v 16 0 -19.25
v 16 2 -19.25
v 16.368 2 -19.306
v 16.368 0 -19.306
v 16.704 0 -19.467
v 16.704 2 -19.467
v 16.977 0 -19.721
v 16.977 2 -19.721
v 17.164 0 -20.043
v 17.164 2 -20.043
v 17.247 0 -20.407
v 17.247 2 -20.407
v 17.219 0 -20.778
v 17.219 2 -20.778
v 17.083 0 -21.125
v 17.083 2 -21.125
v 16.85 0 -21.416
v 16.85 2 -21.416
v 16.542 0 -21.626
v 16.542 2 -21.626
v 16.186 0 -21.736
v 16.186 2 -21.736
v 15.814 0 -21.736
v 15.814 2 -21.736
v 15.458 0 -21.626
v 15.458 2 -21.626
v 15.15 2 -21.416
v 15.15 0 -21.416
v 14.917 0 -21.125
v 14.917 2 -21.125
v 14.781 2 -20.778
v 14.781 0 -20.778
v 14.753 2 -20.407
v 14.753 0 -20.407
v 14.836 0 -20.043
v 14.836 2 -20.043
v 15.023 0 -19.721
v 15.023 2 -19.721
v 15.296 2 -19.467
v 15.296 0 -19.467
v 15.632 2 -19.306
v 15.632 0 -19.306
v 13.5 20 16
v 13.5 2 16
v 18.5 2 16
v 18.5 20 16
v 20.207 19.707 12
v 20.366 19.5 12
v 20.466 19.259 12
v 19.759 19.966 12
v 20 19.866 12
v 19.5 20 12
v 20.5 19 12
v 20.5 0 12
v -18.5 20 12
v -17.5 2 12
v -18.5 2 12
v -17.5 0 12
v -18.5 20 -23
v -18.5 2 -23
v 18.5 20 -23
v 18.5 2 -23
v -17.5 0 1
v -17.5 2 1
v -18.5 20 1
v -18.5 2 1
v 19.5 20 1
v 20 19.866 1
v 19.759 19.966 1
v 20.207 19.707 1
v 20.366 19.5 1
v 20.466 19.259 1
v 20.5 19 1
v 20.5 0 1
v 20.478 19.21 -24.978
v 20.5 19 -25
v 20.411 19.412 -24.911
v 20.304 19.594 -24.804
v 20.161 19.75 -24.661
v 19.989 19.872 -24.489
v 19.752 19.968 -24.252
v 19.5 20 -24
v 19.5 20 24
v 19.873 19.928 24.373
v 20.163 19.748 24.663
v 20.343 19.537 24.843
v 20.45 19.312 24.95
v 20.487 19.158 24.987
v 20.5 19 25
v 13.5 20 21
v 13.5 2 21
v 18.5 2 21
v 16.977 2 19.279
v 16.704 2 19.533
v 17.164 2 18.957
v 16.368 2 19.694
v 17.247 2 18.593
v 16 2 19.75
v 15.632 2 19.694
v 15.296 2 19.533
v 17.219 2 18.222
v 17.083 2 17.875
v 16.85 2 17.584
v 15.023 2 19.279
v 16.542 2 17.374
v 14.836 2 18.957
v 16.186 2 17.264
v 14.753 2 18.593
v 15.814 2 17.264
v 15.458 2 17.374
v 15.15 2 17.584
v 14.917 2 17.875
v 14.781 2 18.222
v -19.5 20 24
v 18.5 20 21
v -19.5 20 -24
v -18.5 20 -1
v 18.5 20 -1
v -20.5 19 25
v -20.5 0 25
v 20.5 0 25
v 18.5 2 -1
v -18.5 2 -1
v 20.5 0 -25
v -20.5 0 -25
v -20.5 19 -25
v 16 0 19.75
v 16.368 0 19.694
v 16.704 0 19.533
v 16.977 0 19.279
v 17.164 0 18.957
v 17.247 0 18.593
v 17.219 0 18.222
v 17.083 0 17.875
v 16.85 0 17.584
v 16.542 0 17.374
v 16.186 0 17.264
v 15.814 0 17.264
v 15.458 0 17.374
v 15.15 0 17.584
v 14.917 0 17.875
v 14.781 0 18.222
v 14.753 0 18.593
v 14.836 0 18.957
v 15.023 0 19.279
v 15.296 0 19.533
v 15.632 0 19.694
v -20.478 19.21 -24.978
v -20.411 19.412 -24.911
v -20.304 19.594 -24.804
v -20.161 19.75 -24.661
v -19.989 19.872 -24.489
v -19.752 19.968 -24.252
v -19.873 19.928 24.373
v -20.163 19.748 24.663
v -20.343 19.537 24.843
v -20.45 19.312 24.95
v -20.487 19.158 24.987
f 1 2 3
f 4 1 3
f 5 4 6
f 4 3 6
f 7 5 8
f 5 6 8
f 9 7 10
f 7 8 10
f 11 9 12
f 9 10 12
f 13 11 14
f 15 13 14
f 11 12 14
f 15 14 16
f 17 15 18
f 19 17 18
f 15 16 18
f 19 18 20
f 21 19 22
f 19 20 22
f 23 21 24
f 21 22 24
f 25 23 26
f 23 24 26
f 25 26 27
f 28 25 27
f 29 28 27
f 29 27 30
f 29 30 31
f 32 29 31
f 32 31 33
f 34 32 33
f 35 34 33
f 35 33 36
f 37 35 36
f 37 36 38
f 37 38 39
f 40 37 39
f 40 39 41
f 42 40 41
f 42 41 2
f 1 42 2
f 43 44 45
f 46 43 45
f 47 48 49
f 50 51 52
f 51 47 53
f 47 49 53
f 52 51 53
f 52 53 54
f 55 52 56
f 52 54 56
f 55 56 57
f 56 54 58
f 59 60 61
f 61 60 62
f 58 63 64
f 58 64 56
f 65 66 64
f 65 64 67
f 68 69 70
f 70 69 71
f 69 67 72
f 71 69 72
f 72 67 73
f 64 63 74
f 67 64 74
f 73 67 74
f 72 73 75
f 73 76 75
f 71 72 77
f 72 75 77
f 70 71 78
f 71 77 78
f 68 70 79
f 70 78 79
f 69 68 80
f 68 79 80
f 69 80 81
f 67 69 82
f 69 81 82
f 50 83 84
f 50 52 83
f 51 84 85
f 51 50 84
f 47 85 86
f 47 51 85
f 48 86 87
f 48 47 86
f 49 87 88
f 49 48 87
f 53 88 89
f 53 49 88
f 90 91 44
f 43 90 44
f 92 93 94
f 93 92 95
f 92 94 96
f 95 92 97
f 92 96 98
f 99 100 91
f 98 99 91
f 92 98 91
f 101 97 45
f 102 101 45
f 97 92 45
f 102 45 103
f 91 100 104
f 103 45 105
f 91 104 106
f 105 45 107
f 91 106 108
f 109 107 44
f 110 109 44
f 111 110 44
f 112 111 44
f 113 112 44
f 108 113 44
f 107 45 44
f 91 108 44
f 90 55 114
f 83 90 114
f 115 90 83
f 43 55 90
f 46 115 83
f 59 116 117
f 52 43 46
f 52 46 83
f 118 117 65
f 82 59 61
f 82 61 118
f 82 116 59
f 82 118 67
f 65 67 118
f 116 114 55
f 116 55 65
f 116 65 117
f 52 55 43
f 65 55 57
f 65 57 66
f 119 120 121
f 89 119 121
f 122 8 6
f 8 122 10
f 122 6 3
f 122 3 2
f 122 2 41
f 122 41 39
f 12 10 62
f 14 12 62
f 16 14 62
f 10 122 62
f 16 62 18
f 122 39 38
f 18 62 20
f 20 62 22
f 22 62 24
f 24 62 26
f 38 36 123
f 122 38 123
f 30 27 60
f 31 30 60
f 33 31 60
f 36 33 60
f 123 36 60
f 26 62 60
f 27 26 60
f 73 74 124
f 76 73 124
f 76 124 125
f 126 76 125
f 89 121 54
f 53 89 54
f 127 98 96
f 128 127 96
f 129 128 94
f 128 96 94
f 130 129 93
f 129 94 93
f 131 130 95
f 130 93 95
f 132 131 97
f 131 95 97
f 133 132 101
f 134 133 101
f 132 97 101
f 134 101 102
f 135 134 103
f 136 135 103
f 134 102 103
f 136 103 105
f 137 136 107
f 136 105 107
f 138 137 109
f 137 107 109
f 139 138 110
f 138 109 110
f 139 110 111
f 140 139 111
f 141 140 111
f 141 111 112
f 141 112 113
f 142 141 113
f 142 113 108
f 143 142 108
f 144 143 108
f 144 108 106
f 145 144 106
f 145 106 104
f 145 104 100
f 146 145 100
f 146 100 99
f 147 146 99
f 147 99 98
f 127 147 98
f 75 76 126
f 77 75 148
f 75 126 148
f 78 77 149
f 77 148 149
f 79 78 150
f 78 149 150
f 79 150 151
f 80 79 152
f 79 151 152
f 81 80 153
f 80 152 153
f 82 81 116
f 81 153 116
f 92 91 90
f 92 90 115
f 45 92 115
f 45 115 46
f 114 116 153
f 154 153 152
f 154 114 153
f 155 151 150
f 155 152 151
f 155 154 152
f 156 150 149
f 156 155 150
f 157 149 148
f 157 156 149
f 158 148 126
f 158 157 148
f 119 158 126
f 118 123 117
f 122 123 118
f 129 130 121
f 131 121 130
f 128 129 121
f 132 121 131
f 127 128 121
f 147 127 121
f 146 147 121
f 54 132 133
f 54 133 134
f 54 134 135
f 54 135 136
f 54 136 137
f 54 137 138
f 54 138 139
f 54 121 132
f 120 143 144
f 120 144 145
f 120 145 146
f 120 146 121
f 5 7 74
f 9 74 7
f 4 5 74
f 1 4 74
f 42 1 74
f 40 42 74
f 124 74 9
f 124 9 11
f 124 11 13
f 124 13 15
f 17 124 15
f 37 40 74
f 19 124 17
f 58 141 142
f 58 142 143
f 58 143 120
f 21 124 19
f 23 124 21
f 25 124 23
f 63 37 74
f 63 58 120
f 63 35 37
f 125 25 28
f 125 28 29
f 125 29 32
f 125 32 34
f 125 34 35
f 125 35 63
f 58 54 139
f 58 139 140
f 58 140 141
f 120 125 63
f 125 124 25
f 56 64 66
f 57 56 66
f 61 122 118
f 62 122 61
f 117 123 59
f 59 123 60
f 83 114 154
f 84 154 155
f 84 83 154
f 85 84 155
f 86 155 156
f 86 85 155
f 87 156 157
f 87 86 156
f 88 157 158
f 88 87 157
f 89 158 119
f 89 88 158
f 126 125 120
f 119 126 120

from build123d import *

# Parameters (mm, degrees)
BOSS_EXTRUDE1_DEPTH = 2
SKETCH2_W           = 5
SKETCH2_H           = 5
SKETCH2_W_2         = 37
SKETCH2_H_2         = 22
BOSS_EXTRUDE3_DEPTH = 18
SKETCH3_R           = 1.25
CUT_EXTRUDE1_DEPTH  = 38.003378224
FILLET1_R           = 1


with BuildPart() as part:
    # Sketch1 → Boss-Extrude1 (new body)
    with BuildSketch(Plane(origin=(0, 0, 0), x_dir=(1, 0, 0), z_dir=(0, 1, 0))):
        Polygon((20.5, 25), (20.5, -1), (-17.5, -1), (-17.5, -12), (20.5, -12), (20.5, -25), (-20.5, -25), (-20.5, 25), align=None)
    extrude(amount=BOSS_EXTRUDE1_DEPTH)

    # Sketch2 → Boss-Extrude3 (add)
    with BuildSketch(Plane(origin=(0, 2, 0), x_dir=(1, 0, 0), z_dir=(0, 1, 0))):
        Polygon((20.5, 25), (-20.5, 25), (-20.5, -25), (20.5, -25), (20.5, -12), (-17.5, -12), (-18.5, -12), (-18.5, -1), (-17.5, -1), (20.5, -1), align=None)
        with Locations((16, -18.5)):
            Rectangle(SKETCH2_W, SKETCH2_H, mode=Mode.SUBTRACT)
        with Locations((0, 12)):
            Rectangle(SKETCH2_W_2, SKETCH2_H_2, mode=Mode.SUBTRACT)
    extrude(amount=BOSS_EXTRUDE3_DEPTH)

    # Sketch3 → Cut-Extrude1 (cut, through all)
    with BuildSketch(Plane(origin=(0, 2, 0), x_dir=(1, 0, 0), z_dir=(0, 1, 0))):
        with Locations(Location((16, 20.5, 0), (0, 0, 270))):
            Circle(SKETCH3_R)
        with Locations(Location((16, -18.5, 0), (0, 0, 270))):
            Circle(SKETCH3_R)
    extrude(amount=-CUT_EXTRUDE1_DEPTH, mode=Mode.SUBTRACT)

    # Fillet1
    fillet1_edges = [part.edges().sort_by_distance(p)[0] for p in [
        (20.5, 20, -12),
        (0, 20, -25),
        (-20.5, 20, 0),
        (0, 20, 25),
        (20.5, 20, 18.5),
    ]]
    fillet(fillet1_edges, radius=FILLET1_R)


solid = part.part
